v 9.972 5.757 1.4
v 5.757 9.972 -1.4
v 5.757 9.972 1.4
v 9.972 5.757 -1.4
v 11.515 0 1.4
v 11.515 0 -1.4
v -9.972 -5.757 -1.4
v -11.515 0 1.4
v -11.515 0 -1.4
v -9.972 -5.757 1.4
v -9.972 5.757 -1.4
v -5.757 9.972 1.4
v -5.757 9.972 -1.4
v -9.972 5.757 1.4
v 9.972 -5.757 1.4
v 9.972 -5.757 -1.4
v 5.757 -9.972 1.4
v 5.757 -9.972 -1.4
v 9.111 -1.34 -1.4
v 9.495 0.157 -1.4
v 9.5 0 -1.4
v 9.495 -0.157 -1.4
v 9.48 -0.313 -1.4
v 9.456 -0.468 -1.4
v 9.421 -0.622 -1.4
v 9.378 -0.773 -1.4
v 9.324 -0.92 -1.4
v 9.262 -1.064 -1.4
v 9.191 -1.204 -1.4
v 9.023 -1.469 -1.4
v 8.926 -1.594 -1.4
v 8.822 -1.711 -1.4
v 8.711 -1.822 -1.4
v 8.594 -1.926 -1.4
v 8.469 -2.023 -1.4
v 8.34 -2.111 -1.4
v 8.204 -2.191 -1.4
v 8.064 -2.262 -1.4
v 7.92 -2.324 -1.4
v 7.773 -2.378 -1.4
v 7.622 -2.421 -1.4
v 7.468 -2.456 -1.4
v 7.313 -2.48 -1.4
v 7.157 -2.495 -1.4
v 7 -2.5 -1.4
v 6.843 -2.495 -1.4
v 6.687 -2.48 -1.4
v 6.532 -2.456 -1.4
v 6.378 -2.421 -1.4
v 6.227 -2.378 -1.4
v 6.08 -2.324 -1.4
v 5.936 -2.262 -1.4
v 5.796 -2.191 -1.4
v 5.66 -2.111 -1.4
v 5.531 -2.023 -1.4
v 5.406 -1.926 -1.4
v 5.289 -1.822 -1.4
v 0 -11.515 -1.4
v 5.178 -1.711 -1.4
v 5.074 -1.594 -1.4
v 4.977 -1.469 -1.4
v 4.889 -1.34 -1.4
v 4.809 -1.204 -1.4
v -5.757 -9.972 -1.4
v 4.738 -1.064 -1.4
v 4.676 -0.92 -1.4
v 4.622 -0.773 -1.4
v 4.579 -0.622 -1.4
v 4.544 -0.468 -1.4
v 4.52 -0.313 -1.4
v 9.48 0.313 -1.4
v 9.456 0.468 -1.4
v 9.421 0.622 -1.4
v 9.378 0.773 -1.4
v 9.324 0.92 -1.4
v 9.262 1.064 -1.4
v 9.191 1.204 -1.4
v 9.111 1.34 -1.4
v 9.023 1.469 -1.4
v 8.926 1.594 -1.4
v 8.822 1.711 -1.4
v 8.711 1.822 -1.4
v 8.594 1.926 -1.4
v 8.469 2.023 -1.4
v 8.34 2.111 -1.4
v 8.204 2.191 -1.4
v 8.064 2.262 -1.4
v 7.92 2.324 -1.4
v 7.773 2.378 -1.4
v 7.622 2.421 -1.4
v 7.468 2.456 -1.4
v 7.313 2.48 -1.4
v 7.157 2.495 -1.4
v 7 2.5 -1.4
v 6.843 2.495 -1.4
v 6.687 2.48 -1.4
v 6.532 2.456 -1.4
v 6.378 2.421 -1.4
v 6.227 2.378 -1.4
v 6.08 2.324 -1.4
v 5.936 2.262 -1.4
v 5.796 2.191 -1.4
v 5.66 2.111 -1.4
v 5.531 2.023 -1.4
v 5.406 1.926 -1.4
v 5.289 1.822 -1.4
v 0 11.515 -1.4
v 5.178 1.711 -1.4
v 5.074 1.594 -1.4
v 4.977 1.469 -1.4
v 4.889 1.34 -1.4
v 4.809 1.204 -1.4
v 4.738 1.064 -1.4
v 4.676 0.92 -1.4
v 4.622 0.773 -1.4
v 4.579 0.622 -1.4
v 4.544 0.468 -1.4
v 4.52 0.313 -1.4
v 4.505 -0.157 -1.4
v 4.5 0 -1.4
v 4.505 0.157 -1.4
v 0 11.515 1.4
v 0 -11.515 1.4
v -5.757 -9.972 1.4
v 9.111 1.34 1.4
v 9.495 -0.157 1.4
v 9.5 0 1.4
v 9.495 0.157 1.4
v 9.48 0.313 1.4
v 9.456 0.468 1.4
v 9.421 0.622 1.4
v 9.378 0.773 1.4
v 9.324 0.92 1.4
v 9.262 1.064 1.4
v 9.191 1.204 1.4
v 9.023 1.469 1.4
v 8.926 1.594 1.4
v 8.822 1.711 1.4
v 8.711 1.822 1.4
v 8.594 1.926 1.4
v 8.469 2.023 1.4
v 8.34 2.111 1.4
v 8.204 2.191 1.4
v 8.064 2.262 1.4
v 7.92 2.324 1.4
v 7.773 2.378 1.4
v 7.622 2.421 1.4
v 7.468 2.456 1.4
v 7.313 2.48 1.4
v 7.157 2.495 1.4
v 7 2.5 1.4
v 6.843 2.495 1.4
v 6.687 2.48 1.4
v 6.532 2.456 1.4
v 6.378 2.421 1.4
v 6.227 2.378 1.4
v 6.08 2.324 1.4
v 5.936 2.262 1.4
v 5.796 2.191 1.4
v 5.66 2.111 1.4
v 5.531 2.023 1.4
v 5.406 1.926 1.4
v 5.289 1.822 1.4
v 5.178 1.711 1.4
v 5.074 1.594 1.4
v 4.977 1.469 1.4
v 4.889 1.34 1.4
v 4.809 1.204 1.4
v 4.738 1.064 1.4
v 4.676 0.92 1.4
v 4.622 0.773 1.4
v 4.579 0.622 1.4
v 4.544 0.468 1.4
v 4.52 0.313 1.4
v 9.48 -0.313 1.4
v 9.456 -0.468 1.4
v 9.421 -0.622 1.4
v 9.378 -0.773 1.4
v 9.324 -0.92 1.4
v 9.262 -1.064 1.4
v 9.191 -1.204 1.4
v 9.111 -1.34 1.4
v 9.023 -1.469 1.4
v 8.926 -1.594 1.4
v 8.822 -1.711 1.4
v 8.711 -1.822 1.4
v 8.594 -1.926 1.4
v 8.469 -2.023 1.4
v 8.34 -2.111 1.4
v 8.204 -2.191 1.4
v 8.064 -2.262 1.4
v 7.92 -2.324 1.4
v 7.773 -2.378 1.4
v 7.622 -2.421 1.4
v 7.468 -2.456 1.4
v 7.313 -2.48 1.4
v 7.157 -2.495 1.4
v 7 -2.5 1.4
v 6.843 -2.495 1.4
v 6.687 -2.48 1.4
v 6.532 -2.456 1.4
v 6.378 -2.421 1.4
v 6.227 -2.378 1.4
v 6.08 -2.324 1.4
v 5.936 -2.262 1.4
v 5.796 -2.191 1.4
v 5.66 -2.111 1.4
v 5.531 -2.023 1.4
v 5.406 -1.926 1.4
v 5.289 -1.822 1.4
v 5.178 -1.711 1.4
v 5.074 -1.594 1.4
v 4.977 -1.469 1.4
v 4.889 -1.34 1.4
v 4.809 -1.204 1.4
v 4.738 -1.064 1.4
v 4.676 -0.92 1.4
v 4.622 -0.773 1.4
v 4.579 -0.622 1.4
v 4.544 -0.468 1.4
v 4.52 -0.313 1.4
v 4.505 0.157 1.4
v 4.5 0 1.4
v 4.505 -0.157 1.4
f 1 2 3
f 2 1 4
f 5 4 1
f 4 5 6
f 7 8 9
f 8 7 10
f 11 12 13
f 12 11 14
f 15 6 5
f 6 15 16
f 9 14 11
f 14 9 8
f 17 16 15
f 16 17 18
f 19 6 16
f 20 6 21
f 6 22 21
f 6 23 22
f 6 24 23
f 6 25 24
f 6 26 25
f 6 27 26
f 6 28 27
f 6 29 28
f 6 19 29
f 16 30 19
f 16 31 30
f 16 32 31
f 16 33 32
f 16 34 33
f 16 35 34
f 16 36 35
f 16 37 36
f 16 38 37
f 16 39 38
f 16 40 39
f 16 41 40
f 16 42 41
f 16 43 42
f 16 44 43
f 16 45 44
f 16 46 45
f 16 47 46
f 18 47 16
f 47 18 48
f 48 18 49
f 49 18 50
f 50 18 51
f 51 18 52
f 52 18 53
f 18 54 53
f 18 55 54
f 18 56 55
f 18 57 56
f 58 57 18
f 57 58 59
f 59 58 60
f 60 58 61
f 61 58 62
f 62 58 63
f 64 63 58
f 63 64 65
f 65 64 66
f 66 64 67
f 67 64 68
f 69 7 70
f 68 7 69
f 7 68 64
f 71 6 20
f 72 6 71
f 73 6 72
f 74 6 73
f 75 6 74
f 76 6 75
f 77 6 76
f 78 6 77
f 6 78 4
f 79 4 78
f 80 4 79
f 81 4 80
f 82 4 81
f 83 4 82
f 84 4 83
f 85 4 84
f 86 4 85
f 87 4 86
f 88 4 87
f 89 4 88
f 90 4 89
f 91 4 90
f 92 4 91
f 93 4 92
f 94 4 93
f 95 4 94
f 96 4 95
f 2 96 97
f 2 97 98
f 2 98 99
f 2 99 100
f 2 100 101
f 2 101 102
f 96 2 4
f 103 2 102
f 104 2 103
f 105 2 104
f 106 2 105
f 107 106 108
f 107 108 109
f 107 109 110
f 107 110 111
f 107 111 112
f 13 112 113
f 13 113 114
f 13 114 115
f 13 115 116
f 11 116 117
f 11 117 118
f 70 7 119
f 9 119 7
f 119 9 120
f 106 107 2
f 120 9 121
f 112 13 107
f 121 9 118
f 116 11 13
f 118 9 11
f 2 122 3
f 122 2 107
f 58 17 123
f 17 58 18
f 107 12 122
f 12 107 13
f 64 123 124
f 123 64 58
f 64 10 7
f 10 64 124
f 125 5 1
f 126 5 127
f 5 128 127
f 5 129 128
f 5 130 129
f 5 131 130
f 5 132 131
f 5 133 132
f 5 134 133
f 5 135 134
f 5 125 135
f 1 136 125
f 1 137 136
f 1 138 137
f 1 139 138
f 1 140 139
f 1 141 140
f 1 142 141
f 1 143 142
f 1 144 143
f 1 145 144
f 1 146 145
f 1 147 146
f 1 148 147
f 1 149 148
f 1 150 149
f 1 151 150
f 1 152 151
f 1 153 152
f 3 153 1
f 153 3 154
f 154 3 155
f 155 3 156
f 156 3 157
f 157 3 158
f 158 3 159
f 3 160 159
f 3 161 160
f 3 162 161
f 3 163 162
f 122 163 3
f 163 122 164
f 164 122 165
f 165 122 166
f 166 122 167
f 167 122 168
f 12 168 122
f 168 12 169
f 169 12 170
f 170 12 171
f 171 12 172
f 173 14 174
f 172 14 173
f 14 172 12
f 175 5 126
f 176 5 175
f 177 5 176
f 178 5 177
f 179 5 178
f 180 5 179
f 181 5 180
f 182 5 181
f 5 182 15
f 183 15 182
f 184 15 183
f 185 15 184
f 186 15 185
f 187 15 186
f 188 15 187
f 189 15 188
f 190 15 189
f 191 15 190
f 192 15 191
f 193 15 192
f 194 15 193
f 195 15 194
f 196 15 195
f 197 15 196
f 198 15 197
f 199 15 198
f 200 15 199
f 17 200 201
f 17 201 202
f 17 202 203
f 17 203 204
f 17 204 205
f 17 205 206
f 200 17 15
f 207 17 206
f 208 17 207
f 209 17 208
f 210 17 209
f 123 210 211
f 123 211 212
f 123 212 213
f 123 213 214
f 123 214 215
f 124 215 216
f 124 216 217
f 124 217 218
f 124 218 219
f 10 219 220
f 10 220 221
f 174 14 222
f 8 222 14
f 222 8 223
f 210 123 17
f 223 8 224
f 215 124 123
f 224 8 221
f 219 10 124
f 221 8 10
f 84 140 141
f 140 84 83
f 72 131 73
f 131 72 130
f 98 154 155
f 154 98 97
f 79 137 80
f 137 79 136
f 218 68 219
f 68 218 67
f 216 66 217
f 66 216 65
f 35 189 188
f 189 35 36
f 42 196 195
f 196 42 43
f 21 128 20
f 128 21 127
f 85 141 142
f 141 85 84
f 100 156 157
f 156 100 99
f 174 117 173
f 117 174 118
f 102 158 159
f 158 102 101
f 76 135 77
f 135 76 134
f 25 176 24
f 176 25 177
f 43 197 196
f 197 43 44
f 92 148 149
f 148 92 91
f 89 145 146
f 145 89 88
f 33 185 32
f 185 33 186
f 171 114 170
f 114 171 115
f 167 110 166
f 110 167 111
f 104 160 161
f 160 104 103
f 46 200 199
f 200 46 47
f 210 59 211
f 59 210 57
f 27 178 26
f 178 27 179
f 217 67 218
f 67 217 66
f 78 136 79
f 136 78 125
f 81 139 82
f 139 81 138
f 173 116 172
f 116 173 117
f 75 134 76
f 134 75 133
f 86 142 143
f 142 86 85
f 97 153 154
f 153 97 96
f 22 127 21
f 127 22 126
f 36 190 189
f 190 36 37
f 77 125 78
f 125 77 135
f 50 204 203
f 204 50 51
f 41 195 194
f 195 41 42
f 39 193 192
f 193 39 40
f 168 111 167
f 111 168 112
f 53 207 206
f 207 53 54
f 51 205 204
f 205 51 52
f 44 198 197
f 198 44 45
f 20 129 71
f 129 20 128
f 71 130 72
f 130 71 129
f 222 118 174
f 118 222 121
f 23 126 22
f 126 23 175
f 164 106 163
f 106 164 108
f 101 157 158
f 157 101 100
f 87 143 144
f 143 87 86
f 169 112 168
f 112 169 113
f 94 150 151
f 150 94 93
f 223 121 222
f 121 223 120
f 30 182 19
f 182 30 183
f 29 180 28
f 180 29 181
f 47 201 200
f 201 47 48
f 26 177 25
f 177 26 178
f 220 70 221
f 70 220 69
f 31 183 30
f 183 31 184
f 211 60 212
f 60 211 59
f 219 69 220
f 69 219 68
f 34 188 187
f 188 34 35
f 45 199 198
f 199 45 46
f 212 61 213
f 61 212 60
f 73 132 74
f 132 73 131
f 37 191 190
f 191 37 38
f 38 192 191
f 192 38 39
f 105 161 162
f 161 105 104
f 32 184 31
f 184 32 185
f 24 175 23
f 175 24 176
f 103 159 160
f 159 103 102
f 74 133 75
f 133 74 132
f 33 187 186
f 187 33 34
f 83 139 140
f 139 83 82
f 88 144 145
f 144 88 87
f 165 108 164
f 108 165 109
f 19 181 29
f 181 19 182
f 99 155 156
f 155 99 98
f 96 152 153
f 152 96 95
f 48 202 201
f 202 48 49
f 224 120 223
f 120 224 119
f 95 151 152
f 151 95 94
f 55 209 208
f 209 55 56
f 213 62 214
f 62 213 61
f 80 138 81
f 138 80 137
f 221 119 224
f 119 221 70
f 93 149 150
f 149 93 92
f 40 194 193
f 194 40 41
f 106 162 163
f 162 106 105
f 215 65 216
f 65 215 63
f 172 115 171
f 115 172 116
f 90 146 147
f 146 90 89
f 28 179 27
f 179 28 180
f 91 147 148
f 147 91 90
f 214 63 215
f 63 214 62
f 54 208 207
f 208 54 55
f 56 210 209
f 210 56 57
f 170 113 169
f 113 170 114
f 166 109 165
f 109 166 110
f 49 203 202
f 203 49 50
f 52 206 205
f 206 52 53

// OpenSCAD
difference()
{
    // 23.03 x 2.8mm, 12 sides
    cylinder($fn = 12, h = 2.8, d = 23.03, center=true);

    // keyring hole
    translate([7,0,0]) cylinder($fn=100, h=4, d=5, center=true);
}
